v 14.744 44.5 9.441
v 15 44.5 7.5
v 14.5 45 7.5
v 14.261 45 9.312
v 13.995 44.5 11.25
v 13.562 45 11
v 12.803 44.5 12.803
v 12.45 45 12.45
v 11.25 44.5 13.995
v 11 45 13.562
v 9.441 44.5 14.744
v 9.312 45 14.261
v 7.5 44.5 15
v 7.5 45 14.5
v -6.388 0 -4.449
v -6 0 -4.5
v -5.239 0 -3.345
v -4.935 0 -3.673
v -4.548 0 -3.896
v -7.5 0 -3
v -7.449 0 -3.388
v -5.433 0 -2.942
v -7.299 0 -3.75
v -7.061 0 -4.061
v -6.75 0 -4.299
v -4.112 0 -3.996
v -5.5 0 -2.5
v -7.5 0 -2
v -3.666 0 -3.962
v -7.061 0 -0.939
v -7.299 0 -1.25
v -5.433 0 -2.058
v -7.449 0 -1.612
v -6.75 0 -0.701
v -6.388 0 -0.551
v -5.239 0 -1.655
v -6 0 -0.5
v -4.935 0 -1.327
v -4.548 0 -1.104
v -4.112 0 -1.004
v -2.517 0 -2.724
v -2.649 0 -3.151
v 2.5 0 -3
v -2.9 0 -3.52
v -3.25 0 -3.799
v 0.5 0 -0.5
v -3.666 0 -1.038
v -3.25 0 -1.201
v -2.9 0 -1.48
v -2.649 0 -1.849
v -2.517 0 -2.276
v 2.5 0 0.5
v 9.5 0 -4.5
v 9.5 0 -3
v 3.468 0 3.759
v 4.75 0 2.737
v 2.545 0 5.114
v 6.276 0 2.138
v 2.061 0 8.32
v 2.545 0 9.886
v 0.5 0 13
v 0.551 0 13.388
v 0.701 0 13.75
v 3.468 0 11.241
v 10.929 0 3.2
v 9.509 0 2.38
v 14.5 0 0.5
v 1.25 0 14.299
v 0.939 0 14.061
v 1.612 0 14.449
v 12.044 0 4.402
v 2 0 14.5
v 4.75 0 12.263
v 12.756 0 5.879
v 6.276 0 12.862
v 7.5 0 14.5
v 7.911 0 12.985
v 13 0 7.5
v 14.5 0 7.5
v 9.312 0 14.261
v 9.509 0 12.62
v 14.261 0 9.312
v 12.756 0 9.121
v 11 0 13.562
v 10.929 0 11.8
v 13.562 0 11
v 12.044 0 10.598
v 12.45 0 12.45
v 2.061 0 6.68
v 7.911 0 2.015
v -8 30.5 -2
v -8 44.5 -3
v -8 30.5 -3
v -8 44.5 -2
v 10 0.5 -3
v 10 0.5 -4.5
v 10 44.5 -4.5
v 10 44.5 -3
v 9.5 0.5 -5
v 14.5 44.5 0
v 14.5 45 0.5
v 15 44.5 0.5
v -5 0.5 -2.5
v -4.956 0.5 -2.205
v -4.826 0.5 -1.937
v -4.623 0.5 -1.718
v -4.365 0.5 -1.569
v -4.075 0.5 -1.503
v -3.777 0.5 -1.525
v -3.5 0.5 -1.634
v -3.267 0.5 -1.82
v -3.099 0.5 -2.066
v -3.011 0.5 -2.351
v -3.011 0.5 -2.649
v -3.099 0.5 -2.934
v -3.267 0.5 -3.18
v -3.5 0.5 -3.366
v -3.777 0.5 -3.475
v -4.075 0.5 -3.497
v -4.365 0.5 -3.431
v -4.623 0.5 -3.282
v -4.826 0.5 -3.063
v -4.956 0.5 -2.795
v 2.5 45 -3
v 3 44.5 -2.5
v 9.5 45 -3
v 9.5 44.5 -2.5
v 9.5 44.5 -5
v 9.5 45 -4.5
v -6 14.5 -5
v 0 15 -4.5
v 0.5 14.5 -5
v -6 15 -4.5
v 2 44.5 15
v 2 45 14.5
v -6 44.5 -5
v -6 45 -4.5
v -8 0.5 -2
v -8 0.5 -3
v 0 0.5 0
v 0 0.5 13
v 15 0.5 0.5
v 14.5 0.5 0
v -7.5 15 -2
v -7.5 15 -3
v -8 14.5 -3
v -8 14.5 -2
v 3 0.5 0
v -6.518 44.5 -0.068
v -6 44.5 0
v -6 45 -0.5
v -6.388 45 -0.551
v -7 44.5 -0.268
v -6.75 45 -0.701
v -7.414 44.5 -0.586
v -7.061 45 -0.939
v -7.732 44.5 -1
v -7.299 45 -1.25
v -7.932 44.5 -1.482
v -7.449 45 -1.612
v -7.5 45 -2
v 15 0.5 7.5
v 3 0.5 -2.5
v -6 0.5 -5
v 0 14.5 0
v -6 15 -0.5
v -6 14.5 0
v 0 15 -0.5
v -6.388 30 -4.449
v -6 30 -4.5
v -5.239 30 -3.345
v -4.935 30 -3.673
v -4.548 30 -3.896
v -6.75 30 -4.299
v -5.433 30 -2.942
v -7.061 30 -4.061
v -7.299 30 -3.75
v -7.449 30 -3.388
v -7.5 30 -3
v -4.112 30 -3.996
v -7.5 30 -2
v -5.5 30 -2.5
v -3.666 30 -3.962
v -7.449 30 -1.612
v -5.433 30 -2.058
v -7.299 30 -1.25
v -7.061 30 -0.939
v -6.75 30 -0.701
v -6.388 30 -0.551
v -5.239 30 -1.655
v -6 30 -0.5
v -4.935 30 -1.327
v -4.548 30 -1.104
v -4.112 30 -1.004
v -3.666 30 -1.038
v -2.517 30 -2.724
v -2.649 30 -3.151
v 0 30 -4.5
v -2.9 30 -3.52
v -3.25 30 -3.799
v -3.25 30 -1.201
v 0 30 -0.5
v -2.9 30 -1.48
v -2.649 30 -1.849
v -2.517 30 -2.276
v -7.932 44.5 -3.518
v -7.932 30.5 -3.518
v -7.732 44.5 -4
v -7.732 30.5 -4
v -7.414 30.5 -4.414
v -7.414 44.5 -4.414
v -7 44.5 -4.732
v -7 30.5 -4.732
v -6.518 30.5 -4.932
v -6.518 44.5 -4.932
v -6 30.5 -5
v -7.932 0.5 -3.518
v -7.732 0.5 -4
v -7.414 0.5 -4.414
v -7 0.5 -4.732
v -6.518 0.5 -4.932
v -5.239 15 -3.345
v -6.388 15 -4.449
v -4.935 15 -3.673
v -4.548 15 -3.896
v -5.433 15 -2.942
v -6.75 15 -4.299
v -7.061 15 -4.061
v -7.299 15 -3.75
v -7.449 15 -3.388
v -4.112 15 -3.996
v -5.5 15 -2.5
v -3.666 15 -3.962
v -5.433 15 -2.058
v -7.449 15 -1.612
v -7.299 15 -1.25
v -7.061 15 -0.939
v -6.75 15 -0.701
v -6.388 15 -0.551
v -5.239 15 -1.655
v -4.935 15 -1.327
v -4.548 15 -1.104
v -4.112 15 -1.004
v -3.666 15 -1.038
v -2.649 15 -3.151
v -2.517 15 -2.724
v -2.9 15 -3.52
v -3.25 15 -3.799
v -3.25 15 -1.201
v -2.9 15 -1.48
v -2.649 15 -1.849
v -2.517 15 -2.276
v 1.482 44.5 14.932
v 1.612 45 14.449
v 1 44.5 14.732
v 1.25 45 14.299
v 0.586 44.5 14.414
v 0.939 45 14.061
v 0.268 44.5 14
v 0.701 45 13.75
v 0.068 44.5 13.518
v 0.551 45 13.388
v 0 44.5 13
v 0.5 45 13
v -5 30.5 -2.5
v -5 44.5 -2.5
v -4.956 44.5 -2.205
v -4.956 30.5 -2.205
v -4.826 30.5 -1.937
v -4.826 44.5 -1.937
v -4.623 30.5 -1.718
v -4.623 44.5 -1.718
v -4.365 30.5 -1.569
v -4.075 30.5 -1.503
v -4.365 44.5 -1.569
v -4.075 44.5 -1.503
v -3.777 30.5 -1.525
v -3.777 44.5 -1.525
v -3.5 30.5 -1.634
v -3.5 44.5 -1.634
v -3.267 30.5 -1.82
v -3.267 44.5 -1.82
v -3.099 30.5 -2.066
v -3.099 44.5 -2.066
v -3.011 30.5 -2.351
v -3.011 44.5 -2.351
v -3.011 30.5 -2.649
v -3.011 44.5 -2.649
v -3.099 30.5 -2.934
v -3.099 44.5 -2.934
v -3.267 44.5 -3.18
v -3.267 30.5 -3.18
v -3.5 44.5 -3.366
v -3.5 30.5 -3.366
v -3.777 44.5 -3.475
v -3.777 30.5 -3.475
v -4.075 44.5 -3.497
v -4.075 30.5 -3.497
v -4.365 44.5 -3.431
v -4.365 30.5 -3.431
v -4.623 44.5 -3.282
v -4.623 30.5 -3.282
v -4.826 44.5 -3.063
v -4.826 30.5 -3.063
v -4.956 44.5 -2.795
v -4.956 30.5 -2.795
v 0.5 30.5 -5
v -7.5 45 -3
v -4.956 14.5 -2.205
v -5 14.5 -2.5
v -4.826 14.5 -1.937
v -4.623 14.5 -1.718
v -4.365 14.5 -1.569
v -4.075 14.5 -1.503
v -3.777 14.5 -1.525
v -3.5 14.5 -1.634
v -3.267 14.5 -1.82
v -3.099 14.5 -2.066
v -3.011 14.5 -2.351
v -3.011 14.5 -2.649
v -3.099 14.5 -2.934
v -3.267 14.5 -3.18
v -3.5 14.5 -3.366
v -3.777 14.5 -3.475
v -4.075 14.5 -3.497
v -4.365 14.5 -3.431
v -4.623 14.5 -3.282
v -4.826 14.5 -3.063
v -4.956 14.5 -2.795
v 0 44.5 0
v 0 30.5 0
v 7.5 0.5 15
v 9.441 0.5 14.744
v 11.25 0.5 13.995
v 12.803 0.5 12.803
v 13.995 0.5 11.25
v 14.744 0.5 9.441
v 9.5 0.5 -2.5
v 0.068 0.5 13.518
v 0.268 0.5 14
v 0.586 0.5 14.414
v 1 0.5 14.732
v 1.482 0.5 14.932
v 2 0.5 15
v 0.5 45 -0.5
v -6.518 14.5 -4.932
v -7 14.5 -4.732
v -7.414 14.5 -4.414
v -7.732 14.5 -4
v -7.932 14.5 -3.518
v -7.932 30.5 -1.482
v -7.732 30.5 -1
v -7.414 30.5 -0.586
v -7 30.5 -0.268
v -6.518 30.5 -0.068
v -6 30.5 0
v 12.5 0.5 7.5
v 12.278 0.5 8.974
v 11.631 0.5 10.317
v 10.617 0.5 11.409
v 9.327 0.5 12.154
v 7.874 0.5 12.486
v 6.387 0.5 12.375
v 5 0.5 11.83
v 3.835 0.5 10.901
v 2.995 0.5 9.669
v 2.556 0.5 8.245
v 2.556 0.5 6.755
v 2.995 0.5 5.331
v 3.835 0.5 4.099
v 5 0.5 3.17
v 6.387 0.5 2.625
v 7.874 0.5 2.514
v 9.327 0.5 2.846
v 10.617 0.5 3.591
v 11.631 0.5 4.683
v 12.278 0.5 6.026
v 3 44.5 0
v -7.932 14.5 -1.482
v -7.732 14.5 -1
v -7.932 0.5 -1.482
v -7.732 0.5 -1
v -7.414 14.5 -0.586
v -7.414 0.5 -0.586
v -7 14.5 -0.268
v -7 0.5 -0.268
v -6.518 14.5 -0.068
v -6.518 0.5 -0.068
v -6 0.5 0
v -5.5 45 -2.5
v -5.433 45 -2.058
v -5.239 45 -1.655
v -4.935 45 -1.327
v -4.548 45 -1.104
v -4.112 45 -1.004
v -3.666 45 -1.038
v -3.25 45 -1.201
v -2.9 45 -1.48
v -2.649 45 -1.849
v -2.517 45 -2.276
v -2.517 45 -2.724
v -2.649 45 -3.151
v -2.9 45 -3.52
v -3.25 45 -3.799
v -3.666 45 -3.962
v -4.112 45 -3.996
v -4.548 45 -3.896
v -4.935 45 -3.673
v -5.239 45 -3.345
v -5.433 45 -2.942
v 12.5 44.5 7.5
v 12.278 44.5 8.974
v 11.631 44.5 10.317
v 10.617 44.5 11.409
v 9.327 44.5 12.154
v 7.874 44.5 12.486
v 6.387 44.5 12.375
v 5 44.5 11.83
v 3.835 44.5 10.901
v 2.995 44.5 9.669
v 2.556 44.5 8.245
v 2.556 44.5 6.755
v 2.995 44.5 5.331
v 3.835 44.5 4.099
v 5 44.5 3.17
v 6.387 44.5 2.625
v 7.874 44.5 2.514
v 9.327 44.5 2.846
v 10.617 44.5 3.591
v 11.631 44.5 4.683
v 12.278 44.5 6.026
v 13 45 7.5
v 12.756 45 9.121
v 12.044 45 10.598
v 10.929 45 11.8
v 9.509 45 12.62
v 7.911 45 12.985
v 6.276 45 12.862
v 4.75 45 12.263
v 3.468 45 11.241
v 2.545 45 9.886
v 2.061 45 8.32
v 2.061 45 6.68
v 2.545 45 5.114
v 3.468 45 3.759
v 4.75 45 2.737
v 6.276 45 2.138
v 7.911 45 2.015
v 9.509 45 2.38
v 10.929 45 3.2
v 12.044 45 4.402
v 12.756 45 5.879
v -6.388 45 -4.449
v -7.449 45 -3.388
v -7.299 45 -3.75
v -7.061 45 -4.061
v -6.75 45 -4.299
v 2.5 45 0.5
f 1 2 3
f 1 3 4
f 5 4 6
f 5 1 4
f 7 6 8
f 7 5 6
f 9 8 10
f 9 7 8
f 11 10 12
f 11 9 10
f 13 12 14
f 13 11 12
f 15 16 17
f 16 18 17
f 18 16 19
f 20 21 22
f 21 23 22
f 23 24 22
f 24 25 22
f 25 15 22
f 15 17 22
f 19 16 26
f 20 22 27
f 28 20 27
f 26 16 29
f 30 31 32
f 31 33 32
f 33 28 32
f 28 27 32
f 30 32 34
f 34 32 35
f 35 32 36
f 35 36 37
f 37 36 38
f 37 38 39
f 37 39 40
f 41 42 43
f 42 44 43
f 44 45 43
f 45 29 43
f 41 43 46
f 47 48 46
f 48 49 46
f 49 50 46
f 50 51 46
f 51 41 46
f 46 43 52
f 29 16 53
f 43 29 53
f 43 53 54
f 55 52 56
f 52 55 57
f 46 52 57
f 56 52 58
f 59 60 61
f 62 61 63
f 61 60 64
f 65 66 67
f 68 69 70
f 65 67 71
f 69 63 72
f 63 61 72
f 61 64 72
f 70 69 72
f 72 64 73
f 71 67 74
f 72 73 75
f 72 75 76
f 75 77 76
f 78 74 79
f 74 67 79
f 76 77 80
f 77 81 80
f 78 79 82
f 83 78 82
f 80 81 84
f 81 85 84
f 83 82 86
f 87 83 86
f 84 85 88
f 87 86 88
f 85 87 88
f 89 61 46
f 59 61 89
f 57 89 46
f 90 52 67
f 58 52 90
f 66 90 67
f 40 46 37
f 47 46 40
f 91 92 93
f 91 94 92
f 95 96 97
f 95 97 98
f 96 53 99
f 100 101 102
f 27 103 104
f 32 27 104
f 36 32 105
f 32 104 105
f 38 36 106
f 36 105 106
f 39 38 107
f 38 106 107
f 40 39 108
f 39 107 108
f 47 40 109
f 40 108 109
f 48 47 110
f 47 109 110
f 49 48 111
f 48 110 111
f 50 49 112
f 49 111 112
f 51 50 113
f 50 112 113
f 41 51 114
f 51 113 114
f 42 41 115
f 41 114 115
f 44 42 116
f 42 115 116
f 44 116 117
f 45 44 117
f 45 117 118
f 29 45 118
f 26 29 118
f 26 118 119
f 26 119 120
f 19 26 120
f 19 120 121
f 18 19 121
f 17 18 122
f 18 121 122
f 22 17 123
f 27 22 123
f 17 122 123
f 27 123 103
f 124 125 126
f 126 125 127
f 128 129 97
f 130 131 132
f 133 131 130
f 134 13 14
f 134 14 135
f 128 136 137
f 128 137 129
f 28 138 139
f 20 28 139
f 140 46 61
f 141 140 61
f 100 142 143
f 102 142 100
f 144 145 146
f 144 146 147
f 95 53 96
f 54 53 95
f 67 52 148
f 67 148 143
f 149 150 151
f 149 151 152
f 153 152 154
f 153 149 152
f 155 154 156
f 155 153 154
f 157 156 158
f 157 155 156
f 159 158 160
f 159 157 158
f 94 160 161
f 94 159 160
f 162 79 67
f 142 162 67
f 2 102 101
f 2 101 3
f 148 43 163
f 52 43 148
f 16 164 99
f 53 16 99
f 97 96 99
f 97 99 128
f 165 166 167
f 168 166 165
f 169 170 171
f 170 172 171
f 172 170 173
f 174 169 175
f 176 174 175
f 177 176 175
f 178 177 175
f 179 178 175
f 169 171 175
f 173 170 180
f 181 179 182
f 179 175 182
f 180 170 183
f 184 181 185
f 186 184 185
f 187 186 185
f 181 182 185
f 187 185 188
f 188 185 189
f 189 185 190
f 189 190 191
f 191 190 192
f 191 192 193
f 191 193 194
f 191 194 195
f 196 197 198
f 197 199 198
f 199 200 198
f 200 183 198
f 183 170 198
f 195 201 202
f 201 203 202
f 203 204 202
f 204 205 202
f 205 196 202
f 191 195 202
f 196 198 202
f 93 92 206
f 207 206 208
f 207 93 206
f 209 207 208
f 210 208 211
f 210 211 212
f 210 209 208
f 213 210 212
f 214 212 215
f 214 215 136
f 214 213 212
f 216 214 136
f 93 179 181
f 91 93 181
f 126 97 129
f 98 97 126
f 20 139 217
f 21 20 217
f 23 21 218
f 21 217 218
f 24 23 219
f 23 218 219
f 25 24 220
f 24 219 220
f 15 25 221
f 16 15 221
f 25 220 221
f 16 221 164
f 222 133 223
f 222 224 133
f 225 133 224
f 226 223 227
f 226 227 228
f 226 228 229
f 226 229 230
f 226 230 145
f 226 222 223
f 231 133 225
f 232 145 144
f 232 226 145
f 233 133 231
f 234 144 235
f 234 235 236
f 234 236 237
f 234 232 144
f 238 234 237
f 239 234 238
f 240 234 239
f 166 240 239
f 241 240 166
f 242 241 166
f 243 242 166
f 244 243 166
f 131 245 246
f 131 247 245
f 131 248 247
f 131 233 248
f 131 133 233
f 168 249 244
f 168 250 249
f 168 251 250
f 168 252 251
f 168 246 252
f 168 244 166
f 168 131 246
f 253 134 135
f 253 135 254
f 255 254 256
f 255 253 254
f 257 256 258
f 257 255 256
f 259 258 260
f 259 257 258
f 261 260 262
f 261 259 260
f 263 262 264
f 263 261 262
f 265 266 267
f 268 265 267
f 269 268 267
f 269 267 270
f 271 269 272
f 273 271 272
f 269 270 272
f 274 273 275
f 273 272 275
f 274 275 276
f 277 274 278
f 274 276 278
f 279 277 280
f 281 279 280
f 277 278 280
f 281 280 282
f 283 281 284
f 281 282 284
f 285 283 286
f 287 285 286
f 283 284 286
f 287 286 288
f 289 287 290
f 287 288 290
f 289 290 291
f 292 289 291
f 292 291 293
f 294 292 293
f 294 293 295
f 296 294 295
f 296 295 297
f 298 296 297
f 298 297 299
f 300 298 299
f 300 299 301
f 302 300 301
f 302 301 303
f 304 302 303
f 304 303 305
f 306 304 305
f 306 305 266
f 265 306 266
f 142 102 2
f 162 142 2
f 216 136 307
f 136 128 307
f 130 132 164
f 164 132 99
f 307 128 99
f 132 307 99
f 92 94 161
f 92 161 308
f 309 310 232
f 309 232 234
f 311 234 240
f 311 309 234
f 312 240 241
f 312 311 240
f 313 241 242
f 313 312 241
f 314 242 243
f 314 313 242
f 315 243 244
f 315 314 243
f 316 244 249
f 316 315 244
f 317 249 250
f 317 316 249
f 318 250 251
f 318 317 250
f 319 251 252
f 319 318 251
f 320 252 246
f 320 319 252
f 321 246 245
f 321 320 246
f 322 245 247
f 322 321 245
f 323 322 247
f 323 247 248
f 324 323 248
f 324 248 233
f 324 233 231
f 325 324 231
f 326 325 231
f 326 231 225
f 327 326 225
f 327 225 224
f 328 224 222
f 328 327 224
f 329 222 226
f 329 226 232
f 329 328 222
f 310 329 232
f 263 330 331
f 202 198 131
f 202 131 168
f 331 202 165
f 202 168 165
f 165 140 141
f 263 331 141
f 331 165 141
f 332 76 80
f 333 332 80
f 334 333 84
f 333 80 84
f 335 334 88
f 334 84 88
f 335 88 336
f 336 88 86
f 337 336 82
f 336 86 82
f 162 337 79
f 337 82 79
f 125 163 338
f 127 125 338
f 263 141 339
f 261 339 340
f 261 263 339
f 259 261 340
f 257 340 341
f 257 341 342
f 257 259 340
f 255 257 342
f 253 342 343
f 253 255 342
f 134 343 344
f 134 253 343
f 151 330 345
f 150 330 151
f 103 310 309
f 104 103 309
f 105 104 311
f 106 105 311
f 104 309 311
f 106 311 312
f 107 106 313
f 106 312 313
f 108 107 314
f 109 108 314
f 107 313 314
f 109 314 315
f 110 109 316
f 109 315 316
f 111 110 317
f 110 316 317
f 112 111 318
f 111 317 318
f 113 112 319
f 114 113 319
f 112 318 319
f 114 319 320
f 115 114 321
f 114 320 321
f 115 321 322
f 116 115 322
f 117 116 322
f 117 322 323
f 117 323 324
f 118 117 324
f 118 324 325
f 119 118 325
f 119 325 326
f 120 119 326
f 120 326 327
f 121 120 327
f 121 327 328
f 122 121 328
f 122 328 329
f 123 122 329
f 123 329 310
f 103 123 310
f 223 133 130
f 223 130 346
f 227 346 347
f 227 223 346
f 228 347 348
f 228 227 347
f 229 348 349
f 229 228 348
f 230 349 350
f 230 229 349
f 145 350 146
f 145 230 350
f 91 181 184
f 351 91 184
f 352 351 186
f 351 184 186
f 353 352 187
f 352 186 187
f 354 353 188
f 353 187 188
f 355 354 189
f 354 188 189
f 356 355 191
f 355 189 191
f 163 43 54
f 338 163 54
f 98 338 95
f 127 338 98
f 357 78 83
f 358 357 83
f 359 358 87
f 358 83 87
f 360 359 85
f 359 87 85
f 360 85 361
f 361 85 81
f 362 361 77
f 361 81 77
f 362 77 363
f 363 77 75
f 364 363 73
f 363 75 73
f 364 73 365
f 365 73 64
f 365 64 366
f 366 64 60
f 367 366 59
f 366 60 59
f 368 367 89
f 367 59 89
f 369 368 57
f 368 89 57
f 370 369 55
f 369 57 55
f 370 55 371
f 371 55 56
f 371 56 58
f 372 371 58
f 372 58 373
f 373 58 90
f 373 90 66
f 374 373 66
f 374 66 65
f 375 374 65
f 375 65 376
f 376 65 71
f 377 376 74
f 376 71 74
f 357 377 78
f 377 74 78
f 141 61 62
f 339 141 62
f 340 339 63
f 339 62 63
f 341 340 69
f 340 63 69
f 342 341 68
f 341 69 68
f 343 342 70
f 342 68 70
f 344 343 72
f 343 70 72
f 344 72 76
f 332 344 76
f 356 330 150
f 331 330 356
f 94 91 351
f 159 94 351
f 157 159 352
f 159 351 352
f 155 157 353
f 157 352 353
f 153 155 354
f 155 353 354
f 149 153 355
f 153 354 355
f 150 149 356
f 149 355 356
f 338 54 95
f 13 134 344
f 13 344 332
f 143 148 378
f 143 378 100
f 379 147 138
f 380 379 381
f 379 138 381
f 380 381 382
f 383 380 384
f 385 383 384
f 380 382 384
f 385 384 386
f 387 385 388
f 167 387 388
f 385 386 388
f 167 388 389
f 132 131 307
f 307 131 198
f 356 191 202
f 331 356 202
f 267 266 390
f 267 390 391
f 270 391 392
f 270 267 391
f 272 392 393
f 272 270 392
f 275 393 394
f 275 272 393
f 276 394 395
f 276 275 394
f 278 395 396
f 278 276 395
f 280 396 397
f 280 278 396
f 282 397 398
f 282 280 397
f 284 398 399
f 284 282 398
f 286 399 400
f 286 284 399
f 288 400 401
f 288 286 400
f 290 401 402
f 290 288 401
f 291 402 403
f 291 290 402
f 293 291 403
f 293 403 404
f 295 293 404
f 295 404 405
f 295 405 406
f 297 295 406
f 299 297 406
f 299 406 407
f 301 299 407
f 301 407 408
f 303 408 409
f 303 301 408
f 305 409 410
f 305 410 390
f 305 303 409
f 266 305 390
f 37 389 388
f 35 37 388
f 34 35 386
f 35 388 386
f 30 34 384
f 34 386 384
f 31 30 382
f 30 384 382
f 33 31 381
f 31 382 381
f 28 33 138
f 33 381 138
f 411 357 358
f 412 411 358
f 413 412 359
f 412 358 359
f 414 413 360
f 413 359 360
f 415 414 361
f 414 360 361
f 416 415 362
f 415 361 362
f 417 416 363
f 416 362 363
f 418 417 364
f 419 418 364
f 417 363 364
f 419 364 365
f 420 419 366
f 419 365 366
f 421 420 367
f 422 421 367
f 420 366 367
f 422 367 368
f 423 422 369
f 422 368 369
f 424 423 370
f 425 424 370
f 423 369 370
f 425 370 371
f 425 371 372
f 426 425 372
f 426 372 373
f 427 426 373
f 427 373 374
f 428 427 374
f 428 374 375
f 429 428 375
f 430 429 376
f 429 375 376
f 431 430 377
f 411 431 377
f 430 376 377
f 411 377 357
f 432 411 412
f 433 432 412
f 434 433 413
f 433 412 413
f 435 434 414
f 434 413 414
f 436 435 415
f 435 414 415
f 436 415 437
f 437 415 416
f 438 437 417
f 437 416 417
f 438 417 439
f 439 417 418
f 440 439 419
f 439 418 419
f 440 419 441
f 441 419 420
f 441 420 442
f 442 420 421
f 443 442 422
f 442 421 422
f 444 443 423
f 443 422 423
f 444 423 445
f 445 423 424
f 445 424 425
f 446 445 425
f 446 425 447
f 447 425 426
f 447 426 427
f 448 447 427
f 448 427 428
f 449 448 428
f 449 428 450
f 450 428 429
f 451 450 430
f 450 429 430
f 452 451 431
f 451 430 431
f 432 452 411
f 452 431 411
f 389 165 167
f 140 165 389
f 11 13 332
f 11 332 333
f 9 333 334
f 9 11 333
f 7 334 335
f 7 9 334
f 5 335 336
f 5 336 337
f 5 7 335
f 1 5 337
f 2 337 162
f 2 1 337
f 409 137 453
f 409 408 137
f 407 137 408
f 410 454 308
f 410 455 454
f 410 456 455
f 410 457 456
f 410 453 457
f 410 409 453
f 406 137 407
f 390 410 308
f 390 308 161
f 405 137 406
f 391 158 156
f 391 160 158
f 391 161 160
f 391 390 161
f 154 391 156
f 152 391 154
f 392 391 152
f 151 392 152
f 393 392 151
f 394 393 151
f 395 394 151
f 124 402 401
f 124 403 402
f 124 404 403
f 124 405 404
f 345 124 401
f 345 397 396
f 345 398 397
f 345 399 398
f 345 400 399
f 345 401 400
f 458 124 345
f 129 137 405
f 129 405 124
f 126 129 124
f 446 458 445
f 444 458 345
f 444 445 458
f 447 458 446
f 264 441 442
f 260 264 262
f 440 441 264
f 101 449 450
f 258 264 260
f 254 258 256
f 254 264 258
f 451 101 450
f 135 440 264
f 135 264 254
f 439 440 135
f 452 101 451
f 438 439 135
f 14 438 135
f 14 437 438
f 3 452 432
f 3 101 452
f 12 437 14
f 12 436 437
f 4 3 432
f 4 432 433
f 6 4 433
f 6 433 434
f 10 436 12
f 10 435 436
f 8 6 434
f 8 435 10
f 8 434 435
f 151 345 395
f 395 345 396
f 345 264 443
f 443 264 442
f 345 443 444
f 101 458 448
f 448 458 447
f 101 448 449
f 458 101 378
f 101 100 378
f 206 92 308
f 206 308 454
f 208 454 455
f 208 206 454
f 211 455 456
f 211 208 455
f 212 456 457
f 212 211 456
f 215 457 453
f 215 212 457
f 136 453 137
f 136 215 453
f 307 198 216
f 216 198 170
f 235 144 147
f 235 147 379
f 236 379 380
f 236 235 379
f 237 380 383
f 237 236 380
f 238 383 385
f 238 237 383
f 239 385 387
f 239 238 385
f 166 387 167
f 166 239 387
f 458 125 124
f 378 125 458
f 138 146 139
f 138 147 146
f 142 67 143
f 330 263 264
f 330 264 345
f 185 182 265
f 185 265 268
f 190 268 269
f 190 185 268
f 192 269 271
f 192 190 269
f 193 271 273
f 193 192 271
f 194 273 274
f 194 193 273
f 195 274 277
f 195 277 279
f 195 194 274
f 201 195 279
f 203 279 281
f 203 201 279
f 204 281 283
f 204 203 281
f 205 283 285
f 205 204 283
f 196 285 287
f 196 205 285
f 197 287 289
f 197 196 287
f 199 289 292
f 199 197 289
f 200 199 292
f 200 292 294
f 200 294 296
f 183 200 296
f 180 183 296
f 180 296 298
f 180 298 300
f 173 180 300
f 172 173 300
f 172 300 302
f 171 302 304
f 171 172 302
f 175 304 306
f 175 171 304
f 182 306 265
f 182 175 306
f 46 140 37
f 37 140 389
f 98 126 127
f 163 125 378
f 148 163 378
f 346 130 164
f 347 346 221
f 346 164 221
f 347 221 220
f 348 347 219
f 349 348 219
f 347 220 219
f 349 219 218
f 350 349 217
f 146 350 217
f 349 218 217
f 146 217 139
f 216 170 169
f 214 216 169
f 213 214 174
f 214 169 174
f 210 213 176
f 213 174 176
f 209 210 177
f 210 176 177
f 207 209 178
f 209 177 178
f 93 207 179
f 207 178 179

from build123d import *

# Parameters (mm, degrees)
F0_W      = 15
F0_H      = 15
F1_DEPTH  = 45
F2_R      = 5
F3_DEPTH  = 45
F4_R      = 7.5
F6_W      = 10
F6_H      = 5
F7_DEPTH  = 45
F8_W      = 7
F8_H      = 2.5
F9_DEPTH  = 45
F10_W     = 15
F10_H     = 5
F11_DEPTH = 8
F12_W     = 15
F12_H     = 5
F13_DEPTH = 8
F14_R     = 1
F15_DEPTH = 45
F16_R     = 2
F17_SIZE  = 0.5


with BuildPart() as f1:
    # F0 (on Front) → F1 (new body)
    with BuildSketch(Plane.XZ):
        with Locations((7.5, 7.5)):
            Rectangle(F0_W, F0_H)
    extrude(amount=-F1_DEPTH)

    # F2 (on face) → F3 (cut)
    with BuildSketch(Plane.XZ):
        with Locations((7.5, 7.5)):
            Circle(F2_R)
    extrude(amount=-F3_DEPTH, mode=Mode.SUBTRACT)

    # F4
    f4_edges = [f1.edges().sort_by_distance(p)[0] for p in [
        (15, 22.5, 15),
    ]]
    fillet(f4_edges, radius=F4_R)

    # F6 (on face) → F7 (join)
    with BuildSketch(Plane.XZ):
        with Locations((5, -2.5)):
            Rectangle(F6_W, F6_H)
    extrude(amount=-F7_DEPTH)

    # F8 (on face) → F9 (cut)
    with BuildSketch(Plane.XZ):
        with Locations((6.5, -1.25)):
            Rectangle(F8_W, F8_H)
    extrude(amount=-F9_DEPTH, mode=Mode.SUBTRACT)

    # F10 (on face) → F11 (join)
    with BuildSketch(Plane(origin=(0, 0, 0), x_dir=(0, -1, 0), z_dir=(-1, 0, 0))):
        with Locations((-7.5, -2.5)):
            Rectangle(F10_W, F10_H)
    extrude(amount=F11_DEPTH)

    # F12 (on face) → F13 (join)
    with BuildSketch(Plane(origin=(0, 0, 0), x_dir=(0, -1, 0), z_dir=(-1, 0, 0))):
        with Locations((-37.5, -2.5)):
            Rectangle(F12_W, F12_H)
    extrude(amount=F13_DEPTH)

    # F14 (on face) → F15 (cut)
    with BuildSketch(Plane(origin=(0, 45, 0), x_dir=(-1, 0, 0), z_dir=(0, 1, 0))):
        with Locations((4, -2.5)):
            Circle(F14_R)
    extrude(amount=-F15_DEPTH, mode=Mode.SUBTRACT)

    # F16
    f16_edges = [f1.edges().sort_by_distance(p)[0] for p in [
        (-8, 37.5, 0),
        (-8, 37.5, -5),
        (-8, 7.5, -5),
        (-8, 7.5, 0),
        (0, 22.5, 15),
    ]]
    fillet(f16_edges, radius=F16_R)

    # F17
    f17_edges = [f1.edges().sort_by_distance(p)[0] for p in [
        (0, 0, 6.5),
        (-3, 0, 0),
        (10, 0, -3.75),
        (6.5, 0, -2.5),
        (3, 0, -1.25),
        (9, 0, 0),
        (2.5, 0, 7.5),
        (-3, 15, -5),
        (-3, 15, -2.5),
        (-3, 0, -2.5),
        (-3, 30, -2.5),
        (2, 0, -5),
        (-7.414214, 45, -4.414214),
        (10, 45, -3.75),
        (6.5, 45, -2.5),
        (3, 45, -1.25),
        (9, 45, 0),
        (2.5, 45, 7.5),
        (15, 45, 3.75),
        (-3, 45, -2.5),
        (15, 22.5, 0),
        (10, 22.5, -5),
        (10, 22.5, -2.5),
        (0, 22.5, -5),
        (4.75, 0, 15),
        (4.75, 45, 15),
        (0.585786, 0, 14.414214),
        (12.803301, 0, 12.803301),
        (15, 0, 3.75),
        (-7.414214, 0, -0.585786),
        (-8, 0, -2.5),
        (-7.414214, 0, -4.414214),
        (0.585786, 45, 14.414214),
        (12.803301, 45, 12.803301),
        (0, 45, 6.5),
        (-3, 45, 0),
        (-7.414214, 45, -0.585786),
        (-8, 45, -2.5),
        (2, 45, -5),
        (-3, 15, 0),
        (-7.414214, 15, -0.585786),
        (-8, 15, -2.5),
        (-7.414214, 15, -4.414214),
        (-3, 30, -5),
        (-3, 30, 0),
        (-7.414214, 30, -0.585786),
        (-8, 30, -2.5),
        (-7.414214, 30, -4.414214),
    ]]
    chamfer(f17_edges, length=F17_SIZE)


solid = f1.part
